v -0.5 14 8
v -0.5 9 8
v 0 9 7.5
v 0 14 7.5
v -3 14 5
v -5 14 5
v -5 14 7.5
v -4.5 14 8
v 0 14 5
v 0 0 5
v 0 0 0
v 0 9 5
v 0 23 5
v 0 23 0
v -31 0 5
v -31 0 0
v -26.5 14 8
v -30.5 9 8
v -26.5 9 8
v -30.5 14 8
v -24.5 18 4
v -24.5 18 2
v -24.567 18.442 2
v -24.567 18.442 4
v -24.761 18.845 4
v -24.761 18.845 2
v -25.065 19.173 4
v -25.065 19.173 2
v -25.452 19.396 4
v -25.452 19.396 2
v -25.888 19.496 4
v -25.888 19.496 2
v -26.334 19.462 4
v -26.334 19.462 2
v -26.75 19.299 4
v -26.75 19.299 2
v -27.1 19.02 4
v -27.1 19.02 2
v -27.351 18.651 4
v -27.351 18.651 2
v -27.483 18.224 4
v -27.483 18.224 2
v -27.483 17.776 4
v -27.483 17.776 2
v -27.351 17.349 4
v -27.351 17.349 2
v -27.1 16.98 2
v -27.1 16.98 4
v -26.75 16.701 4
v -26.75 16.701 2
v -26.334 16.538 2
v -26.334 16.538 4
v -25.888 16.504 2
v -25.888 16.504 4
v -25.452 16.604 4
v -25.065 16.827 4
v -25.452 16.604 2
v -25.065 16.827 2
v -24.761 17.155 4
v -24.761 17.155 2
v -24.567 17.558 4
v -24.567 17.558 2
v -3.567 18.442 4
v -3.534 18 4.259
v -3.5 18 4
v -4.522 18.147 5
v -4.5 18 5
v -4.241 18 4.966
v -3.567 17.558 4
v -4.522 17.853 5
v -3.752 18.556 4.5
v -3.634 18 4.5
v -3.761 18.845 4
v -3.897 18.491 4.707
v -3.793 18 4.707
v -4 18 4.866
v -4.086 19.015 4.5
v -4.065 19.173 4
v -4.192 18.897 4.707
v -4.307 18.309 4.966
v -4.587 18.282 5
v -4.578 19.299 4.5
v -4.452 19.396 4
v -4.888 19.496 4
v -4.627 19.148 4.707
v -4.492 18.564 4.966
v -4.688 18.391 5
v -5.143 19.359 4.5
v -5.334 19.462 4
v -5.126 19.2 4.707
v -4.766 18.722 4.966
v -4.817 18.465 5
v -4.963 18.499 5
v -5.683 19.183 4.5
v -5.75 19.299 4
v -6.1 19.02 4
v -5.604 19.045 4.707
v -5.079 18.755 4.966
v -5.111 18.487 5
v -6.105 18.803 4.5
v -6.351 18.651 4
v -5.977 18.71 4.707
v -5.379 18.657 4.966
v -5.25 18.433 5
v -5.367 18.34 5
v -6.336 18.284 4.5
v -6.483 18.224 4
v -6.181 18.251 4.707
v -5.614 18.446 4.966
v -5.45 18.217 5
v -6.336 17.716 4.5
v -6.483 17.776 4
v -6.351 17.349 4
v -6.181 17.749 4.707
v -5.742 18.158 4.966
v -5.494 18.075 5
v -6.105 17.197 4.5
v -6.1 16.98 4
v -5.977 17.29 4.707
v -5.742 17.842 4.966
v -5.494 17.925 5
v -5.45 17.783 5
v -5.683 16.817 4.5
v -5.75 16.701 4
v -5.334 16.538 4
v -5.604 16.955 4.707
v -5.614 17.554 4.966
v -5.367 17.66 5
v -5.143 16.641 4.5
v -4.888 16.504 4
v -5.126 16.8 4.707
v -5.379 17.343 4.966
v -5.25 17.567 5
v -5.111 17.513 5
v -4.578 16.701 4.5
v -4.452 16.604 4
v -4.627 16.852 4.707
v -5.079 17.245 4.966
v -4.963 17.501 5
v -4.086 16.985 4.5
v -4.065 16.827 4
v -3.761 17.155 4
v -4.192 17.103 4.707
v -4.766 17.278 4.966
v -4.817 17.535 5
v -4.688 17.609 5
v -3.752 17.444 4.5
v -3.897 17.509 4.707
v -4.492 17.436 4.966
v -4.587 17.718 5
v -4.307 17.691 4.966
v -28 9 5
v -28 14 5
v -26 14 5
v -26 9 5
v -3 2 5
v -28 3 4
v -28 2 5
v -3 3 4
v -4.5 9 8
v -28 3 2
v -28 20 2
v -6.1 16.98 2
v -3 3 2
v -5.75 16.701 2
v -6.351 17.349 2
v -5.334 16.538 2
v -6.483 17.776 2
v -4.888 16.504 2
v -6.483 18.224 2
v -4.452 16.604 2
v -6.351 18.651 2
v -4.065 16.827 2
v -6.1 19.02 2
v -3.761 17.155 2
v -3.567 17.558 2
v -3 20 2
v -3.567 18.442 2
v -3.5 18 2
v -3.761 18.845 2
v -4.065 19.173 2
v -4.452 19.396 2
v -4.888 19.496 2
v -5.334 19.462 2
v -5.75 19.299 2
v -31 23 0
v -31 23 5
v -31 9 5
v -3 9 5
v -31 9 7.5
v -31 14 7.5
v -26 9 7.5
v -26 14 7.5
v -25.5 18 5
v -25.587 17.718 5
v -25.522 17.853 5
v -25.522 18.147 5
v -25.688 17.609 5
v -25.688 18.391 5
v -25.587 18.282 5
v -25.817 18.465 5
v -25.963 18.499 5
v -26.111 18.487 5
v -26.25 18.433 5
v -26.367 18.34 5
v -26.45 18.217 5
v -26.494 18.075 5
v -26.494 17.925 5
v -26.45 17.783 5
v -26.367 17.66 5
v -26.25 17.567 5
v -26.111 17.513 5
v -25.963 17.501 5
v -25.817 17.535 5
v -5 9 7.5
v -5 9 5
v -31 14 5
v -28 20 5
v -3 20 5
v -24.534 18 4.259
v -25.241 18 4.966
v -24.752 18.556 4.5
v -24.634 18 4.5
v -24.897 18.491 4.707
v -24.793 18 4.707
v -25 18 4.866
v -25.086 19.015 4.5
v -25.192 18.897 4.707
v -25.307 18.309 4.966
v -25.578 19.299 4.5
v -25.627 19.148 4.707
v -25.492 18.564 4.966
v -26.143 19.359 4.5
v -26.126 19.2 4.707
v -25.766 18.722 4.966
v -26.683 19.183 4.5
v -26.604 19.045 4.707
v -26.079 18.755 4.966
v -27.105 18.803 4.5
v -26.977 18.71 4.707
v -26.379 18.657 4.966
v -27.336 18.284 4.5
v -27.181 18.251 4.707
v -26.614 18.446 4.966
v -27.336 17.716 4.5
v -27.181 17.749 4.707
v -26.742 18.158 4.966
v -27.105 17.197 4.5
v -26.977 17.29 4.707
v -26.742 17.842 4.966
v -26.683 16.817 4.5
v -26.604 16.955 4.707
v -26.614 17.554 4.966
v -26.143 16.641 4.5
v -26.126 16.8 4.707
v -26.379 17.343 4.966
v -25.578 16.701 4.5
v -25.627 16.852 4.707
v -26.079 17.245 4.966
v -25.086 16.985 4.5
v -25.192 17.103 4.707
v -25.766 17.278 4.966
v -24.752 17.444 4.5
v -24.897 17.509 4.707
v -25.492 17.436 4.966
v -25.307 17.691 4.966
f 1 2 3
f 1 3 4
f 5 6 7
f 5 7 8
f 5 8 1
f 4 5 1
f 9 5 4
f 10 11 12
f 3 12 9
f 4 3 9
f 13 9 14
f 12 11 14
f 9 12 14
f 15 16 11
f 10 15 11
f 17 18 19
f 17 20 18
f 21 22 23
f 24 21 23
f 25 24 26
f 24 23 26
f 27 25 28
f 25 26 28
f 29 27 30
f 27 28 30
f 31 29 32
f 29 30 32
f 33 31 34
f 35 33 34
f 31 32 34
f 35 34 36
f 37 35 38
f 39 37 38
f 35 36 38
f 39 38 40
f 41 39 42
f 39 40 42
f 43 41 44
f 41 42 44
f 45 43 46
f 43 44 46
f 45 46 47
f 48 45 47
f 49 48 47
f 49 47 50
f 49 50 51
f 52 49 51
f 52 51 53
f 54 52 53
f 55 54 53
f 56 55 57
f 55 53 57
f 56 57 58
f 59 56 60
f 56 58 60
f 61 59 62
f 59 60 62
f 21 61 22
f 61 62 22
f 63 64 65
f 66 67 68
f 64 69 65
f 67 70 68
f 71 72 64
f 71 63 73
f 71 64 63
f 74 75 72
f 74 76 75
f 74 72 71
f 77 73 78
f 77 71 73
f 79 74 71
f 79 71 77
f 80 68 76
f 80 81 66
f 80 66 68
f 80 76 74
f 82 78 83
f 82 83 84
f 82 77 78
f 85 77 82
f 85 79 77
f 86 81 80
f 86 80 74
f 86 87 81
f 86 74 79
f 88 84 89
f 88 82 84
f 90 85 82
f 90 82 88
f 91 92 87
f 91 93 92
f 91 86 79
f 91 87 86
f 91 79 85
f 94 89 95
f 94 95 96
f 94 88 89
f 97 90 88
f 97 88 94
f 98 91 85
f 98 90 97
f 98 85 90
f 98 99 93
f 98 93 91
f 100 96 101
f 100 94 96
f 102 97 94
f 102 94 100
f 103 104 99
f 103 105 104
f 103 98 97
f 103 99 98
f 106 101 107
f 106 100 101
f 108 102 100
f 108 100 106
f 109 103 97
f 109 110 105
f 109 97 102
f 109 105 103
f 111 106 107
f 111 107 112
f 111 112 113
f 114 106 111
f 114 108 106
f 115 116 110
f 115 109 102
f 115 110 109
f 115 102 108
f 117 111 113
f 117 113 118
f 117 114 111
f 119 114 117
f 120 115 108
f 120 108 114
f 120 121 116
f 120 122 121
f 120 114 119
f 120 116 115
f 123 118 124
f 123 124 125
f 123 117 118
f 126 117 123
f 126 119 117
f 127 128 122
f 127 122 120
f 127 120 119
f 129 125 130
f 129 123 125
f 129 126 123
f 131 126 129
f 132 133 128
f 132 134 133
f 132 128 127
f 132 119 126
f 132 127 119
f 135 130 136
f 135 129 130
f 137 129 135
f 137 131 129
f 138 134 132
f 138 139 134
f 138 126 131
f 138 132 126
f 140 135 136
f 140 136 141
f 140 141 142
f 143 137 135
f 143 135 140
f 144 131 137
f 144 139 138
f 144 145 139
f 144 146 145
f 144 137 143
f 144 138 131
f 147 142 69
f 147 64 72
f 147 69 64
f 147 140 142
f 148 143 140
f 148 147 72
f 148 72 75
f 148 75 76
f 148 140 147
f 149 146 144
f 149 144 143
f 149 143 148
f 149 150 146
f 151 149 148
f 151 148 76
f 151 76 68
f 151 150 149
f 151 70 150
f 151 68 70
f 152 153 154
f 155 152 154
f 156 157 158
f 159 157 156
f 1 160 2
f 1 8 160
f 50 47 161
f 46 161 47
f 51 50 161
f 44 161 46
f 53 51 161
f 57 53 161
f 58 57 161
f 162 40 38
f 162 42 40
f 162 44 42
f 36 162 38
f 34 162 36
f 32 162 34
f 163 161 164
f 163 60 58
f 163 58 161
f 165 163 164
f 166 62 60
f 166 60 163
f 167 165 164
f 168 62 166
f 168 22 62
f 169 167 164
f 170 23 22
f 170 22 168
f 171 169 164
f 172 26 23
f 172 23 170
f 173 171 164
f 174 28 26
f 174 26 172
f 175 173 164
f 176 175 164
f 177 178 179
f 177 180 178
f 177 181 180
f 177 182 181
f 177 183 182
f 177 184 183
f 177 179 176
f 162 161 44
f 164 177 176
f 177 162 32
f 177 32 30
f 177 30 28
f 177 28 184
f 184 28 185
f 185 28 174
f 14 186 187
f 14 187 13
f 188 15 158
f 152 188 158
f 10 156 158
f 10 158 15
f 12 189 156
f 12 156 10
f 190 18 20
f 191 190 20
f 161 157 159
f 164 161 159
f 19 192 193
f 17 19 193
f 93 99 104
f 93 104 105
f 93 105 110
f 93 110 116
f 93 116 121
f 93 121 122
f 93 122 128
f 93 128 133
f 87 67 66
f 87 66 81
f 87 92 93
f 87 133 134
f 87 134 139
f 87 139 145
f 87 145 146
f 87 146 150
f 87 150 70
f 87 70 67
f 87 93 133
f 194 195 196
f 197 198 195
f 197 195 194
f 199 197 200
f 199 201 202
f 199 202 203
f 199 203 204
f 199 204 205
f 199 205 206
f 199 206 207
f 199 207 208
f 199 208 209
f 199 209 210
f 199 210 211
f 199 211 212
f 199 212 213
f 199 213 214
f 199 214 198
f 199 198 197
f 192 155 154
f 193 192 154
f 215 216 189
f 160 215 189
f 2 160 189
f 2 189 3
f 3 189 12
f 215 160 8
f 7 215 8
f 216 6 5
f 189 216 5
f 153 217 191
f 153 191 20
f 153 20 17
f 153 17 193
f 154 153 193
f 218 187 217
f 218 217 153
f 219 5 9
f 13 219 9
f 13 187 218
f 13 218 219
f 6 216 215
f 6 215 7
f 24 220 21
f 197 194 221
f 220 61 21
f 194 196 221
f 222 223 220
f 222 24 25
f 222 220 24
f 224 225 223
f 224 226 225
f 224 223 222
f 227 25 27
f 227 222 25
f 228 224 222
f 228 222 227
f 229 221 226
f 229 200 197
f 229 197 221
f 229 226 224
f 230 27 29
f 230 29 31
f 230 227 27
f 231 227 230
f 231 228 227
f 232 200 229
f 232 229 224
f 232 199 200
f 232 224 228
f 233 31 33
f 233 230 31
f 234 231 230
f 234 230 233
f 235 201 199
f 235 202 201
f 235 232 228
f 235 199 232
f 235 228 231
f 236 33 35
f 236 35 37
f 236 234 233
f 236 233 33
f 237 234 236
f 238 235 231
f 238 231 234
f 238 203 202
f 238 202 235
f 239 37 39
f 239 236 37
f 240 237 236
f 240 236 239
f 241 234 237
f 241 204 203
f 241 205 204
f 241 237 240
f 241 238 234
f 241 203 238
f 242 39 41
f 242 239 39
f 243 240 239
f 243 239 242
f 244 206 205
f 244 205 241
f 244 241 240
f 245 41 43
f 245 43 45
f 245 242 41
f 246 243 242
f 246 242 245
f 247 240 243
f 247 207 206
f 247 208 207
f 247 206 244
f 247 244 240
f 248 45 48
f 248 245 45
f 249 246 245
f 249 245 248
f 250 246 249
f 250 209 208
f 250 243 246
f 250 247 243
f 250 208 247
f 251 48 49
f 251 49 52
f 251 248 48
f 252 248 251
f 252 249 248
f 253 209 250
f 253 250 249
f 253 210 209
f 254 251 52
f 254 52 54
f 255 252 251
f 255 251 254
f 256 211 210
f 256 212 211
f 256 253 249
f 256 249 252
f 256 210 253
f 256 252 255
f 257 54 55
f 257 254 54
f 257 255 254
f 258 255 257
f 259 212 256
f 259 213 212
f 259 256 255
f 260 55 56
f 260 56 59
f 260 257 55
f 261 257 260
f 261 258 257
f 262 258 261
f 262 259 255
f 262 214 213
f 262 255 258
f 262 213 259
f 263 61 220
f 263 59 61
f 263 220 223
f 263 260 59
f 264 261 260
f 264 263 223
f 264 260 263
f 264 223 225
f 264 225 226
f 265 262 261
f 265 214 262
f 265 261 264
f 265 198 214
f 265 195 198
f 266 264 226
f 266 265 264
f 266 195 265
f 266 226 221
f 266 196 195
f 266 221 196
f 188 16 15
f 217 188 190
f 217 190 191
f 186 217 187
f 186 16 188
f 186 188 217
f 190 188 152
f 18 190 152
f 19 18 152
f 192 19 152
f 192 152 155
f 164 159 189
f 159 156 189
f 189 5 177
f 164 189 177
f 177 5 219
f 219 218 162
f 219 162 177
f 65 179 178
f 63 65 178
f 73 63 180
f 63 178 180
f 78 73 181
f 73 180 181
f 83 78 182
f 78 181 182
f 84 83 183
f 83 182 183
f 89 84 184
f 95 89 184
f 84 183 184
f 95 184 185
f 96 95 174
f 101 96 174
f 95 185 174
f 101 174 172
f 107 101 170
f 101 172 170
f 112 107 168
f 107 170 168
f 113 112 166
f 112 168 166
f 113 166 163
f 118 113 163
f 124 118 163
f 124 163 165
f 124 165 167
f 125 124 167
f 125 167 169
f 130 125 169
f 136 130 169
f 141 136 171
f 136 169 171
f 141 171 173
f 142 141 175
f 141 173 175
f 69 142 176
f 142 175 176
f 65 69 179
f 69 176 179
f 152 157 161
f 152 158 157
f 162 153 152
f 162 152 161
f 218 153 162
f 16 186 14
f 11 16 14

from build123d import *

# Parameters (mm, degrees)
ESQUISSE1_W             = 31
ESQUISSE1_H             = 23
BOSS_EXTRU_1_DEPTH      = 5
ESQUISSE2_W             = 25
ESQUISSE2_H             = 17
ENL_V_MAT_EXTRU_1_DEPTH = 3
ESQUISSE3_R             = 1.5
BOSS_EXTRU_2_DEPTH      = 3
CONG_1_R                = 1
ESQUISSE4_W             = 5
ESQUISSE4_H             = 5
BOSS_EXTRU_3_DEPTH      = 3
CHANFREIN1_SIZE         = 0.5
CHANFREIN2_SIZE         = 1


with BuildPart() as part:
    # Esquisse1 → Boss.-Extru.1 (new body)
    with BuildSketch(Plane.XY):
        with Locations((-15.5, 11.5)):
            Rectangle(ESQUISSE1_W, ESQUISSE1_H)
    extrude(amount=BOSS_EXTRU_1_DEPTH)

    # Esquisse2 → Enlèv. mat.-Extru.1 (cut)
    with BuildSketch(Plane.XY.offset(5)):
        with Locations((-15.5, 11.5)):
            Rectangle(ESQUISSE2_W, ESQUISSE2_H)
    extrude(amount=-ENL_V_MAT_EXTRU_1_DEPTH, mode=Mode.SUBTRACT)

    # Esquisse3 → Boss.-Extru.2 (add)
    with BuildSketch(Plane.XY.offset(2)):
        with Locations((-26, 18)):
            Circle(ESQUISSE3_R)
        with Locations((-5, 18)):
            Circle(ESQUISSE3_R)
    extrude(amount=BOSS_EXTRU_2_DEPTH)

    # Congé1
    cong_1_edges = [part.edges().sort_by_distance(p)[0] for p in [
        (-27.5, 18, 5),
        (-6.5, 18, 5),
    ]]
    fillet(cong_1_edges, radius=CONG_1_R)

    # Esquisse4 → Boss.-Extru.3 (add)
    with BuildSketch(Plane.XY.offset(5)):
        with Locations((-28.5, 11.5)):
            Rectangle(ESQUISSE4_W, ESQUISSE4_H)
        with Locations((-2.5, 11.5)):
            Rectangle(ESQUISSE4_W, ESQUISSE4_H)
    extrude(amount=BOSS_EXTRU_3_DEPTH)

    # Chanfrein1
    chanfrein1_edges = [part.edges().sort_by_distance(p)[0] for p in [
        (0, 11.5, 8),
        (-5, 11.5, 8),
        (-26, 11.5, 8),
        (-31, 11.5, 8),
    ]]
    chamfer(chanfrein1_edges, length=CHANFREIN1_SIZE)

    # Chanfrein2
    chanfrein2_edges = [part.edges().sort_by_distance(p)[0] for p in [
        (-15.5, 3, 5),
    ]]
    chamfer(chanfrein2_edges, length=CHANFREIN2_SIZE)


solid = part.part
